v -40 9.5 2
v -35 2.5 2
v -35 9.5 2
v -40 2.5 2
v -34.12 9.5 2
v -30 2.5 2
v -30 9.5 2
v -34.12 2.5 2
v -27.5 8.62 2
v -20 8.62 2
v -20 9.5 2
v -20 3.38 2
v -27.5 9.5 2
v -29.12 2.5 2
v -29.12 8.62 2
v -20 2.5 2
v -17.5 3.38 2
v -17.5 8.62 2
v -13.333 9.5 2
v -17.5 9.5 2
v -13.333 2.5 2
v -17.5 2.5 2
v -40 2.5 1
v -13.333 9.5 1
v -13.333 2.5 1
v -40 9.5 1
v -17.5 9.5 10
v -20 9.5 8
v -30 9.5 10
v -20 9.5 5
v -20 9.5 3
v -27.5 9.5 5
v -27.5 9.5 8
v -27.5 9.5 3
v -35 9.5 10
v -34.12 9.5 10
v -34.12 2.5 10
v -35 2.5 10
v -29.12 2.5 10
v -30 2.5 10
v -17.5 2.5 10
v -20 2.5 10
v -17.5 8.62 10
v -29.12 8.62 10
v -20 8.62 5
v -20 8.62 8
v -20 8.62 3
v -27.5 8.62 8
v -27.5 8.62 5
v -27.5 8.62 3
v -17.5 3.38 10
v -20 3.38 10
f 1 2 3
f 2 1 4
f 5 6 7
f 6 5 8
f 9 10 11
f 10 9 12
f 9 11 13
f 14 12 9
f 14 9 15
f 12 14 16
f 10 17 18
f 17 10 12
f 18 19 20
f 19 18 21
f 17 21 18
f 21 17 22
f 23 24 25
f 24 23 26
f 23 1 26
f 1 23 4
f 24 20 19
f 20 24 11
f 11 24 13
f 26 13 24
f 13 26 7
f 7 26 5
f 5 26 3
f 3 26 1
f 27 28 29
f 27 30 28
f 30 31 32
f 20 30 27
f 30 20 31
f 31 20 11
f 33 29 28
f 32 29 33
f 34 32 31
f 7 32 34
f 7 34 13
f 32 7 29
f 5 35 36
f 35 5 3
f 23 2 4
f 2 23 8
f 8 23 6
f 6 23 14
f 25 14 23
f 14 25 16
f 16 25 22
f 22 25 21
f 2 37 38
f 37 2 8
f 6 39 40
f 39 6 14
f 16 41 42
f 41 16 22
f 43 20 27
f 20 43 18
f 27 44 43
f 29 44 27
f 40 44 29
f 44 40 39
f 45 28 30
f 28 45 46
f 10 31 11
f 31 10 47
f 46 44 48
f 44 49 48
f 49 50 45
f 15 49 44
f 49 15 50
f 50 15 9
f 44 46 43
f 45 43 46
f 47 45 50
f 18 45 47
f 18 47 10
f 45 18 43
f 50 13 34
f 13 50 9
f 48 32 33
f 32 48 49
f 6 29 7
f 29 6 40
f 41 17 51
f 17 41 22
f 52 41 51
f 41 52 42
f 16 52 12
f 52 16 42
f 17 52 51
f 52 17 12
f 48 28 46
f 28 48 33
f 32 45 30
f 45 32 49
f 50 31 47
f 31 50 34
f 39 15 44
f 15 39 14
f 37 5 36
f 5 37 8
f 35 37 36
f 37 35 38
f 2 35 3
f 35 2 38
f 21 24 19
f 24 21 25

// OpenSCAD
$fn=100; // recomended value for smooth circle is 60
h=12;

/* ----- execute ----- */

bp=7;
dx=40;
dy=5;
lw=.44; //lineWidth



difference(){
    union(){
        translate([-dx, 2.5, 1])
        cube([dx+15, bp, 1]);

        translate([-dx/2, bp+2.5-lw*2, 1])
        cube([2.5, lw*2, h-3]);
        translate([-dx/4*3, bp+2.5-lw*2, 1])
        cube([2.5, lw*2, h-3]);

        translate([-dx/2, 2.5, 1])
        cube([2.5, lw*2, h-3]);
    
        if(h>10){
            translate([-dx/4*3, bp+2.5-lw*2, h-4])
            cube([dx/4, lw*2, 2]);
        }
        translate([-dx/4*3, bp+2.5-lw*2, 3])
        cube([dx/4, lw*2, 2]);

        translate([-dx/4*3, 2.5, 1])
        cube([lw*2, bp, h-3]);
        translate([-dx/4*3.5, 2.5, 1])
        cube([lw*2, bp, h-3]);
    }
    
    
    translate([-dx/3, 2, 0])
    cube([dx+15, bp+1, 5]);
        
}
